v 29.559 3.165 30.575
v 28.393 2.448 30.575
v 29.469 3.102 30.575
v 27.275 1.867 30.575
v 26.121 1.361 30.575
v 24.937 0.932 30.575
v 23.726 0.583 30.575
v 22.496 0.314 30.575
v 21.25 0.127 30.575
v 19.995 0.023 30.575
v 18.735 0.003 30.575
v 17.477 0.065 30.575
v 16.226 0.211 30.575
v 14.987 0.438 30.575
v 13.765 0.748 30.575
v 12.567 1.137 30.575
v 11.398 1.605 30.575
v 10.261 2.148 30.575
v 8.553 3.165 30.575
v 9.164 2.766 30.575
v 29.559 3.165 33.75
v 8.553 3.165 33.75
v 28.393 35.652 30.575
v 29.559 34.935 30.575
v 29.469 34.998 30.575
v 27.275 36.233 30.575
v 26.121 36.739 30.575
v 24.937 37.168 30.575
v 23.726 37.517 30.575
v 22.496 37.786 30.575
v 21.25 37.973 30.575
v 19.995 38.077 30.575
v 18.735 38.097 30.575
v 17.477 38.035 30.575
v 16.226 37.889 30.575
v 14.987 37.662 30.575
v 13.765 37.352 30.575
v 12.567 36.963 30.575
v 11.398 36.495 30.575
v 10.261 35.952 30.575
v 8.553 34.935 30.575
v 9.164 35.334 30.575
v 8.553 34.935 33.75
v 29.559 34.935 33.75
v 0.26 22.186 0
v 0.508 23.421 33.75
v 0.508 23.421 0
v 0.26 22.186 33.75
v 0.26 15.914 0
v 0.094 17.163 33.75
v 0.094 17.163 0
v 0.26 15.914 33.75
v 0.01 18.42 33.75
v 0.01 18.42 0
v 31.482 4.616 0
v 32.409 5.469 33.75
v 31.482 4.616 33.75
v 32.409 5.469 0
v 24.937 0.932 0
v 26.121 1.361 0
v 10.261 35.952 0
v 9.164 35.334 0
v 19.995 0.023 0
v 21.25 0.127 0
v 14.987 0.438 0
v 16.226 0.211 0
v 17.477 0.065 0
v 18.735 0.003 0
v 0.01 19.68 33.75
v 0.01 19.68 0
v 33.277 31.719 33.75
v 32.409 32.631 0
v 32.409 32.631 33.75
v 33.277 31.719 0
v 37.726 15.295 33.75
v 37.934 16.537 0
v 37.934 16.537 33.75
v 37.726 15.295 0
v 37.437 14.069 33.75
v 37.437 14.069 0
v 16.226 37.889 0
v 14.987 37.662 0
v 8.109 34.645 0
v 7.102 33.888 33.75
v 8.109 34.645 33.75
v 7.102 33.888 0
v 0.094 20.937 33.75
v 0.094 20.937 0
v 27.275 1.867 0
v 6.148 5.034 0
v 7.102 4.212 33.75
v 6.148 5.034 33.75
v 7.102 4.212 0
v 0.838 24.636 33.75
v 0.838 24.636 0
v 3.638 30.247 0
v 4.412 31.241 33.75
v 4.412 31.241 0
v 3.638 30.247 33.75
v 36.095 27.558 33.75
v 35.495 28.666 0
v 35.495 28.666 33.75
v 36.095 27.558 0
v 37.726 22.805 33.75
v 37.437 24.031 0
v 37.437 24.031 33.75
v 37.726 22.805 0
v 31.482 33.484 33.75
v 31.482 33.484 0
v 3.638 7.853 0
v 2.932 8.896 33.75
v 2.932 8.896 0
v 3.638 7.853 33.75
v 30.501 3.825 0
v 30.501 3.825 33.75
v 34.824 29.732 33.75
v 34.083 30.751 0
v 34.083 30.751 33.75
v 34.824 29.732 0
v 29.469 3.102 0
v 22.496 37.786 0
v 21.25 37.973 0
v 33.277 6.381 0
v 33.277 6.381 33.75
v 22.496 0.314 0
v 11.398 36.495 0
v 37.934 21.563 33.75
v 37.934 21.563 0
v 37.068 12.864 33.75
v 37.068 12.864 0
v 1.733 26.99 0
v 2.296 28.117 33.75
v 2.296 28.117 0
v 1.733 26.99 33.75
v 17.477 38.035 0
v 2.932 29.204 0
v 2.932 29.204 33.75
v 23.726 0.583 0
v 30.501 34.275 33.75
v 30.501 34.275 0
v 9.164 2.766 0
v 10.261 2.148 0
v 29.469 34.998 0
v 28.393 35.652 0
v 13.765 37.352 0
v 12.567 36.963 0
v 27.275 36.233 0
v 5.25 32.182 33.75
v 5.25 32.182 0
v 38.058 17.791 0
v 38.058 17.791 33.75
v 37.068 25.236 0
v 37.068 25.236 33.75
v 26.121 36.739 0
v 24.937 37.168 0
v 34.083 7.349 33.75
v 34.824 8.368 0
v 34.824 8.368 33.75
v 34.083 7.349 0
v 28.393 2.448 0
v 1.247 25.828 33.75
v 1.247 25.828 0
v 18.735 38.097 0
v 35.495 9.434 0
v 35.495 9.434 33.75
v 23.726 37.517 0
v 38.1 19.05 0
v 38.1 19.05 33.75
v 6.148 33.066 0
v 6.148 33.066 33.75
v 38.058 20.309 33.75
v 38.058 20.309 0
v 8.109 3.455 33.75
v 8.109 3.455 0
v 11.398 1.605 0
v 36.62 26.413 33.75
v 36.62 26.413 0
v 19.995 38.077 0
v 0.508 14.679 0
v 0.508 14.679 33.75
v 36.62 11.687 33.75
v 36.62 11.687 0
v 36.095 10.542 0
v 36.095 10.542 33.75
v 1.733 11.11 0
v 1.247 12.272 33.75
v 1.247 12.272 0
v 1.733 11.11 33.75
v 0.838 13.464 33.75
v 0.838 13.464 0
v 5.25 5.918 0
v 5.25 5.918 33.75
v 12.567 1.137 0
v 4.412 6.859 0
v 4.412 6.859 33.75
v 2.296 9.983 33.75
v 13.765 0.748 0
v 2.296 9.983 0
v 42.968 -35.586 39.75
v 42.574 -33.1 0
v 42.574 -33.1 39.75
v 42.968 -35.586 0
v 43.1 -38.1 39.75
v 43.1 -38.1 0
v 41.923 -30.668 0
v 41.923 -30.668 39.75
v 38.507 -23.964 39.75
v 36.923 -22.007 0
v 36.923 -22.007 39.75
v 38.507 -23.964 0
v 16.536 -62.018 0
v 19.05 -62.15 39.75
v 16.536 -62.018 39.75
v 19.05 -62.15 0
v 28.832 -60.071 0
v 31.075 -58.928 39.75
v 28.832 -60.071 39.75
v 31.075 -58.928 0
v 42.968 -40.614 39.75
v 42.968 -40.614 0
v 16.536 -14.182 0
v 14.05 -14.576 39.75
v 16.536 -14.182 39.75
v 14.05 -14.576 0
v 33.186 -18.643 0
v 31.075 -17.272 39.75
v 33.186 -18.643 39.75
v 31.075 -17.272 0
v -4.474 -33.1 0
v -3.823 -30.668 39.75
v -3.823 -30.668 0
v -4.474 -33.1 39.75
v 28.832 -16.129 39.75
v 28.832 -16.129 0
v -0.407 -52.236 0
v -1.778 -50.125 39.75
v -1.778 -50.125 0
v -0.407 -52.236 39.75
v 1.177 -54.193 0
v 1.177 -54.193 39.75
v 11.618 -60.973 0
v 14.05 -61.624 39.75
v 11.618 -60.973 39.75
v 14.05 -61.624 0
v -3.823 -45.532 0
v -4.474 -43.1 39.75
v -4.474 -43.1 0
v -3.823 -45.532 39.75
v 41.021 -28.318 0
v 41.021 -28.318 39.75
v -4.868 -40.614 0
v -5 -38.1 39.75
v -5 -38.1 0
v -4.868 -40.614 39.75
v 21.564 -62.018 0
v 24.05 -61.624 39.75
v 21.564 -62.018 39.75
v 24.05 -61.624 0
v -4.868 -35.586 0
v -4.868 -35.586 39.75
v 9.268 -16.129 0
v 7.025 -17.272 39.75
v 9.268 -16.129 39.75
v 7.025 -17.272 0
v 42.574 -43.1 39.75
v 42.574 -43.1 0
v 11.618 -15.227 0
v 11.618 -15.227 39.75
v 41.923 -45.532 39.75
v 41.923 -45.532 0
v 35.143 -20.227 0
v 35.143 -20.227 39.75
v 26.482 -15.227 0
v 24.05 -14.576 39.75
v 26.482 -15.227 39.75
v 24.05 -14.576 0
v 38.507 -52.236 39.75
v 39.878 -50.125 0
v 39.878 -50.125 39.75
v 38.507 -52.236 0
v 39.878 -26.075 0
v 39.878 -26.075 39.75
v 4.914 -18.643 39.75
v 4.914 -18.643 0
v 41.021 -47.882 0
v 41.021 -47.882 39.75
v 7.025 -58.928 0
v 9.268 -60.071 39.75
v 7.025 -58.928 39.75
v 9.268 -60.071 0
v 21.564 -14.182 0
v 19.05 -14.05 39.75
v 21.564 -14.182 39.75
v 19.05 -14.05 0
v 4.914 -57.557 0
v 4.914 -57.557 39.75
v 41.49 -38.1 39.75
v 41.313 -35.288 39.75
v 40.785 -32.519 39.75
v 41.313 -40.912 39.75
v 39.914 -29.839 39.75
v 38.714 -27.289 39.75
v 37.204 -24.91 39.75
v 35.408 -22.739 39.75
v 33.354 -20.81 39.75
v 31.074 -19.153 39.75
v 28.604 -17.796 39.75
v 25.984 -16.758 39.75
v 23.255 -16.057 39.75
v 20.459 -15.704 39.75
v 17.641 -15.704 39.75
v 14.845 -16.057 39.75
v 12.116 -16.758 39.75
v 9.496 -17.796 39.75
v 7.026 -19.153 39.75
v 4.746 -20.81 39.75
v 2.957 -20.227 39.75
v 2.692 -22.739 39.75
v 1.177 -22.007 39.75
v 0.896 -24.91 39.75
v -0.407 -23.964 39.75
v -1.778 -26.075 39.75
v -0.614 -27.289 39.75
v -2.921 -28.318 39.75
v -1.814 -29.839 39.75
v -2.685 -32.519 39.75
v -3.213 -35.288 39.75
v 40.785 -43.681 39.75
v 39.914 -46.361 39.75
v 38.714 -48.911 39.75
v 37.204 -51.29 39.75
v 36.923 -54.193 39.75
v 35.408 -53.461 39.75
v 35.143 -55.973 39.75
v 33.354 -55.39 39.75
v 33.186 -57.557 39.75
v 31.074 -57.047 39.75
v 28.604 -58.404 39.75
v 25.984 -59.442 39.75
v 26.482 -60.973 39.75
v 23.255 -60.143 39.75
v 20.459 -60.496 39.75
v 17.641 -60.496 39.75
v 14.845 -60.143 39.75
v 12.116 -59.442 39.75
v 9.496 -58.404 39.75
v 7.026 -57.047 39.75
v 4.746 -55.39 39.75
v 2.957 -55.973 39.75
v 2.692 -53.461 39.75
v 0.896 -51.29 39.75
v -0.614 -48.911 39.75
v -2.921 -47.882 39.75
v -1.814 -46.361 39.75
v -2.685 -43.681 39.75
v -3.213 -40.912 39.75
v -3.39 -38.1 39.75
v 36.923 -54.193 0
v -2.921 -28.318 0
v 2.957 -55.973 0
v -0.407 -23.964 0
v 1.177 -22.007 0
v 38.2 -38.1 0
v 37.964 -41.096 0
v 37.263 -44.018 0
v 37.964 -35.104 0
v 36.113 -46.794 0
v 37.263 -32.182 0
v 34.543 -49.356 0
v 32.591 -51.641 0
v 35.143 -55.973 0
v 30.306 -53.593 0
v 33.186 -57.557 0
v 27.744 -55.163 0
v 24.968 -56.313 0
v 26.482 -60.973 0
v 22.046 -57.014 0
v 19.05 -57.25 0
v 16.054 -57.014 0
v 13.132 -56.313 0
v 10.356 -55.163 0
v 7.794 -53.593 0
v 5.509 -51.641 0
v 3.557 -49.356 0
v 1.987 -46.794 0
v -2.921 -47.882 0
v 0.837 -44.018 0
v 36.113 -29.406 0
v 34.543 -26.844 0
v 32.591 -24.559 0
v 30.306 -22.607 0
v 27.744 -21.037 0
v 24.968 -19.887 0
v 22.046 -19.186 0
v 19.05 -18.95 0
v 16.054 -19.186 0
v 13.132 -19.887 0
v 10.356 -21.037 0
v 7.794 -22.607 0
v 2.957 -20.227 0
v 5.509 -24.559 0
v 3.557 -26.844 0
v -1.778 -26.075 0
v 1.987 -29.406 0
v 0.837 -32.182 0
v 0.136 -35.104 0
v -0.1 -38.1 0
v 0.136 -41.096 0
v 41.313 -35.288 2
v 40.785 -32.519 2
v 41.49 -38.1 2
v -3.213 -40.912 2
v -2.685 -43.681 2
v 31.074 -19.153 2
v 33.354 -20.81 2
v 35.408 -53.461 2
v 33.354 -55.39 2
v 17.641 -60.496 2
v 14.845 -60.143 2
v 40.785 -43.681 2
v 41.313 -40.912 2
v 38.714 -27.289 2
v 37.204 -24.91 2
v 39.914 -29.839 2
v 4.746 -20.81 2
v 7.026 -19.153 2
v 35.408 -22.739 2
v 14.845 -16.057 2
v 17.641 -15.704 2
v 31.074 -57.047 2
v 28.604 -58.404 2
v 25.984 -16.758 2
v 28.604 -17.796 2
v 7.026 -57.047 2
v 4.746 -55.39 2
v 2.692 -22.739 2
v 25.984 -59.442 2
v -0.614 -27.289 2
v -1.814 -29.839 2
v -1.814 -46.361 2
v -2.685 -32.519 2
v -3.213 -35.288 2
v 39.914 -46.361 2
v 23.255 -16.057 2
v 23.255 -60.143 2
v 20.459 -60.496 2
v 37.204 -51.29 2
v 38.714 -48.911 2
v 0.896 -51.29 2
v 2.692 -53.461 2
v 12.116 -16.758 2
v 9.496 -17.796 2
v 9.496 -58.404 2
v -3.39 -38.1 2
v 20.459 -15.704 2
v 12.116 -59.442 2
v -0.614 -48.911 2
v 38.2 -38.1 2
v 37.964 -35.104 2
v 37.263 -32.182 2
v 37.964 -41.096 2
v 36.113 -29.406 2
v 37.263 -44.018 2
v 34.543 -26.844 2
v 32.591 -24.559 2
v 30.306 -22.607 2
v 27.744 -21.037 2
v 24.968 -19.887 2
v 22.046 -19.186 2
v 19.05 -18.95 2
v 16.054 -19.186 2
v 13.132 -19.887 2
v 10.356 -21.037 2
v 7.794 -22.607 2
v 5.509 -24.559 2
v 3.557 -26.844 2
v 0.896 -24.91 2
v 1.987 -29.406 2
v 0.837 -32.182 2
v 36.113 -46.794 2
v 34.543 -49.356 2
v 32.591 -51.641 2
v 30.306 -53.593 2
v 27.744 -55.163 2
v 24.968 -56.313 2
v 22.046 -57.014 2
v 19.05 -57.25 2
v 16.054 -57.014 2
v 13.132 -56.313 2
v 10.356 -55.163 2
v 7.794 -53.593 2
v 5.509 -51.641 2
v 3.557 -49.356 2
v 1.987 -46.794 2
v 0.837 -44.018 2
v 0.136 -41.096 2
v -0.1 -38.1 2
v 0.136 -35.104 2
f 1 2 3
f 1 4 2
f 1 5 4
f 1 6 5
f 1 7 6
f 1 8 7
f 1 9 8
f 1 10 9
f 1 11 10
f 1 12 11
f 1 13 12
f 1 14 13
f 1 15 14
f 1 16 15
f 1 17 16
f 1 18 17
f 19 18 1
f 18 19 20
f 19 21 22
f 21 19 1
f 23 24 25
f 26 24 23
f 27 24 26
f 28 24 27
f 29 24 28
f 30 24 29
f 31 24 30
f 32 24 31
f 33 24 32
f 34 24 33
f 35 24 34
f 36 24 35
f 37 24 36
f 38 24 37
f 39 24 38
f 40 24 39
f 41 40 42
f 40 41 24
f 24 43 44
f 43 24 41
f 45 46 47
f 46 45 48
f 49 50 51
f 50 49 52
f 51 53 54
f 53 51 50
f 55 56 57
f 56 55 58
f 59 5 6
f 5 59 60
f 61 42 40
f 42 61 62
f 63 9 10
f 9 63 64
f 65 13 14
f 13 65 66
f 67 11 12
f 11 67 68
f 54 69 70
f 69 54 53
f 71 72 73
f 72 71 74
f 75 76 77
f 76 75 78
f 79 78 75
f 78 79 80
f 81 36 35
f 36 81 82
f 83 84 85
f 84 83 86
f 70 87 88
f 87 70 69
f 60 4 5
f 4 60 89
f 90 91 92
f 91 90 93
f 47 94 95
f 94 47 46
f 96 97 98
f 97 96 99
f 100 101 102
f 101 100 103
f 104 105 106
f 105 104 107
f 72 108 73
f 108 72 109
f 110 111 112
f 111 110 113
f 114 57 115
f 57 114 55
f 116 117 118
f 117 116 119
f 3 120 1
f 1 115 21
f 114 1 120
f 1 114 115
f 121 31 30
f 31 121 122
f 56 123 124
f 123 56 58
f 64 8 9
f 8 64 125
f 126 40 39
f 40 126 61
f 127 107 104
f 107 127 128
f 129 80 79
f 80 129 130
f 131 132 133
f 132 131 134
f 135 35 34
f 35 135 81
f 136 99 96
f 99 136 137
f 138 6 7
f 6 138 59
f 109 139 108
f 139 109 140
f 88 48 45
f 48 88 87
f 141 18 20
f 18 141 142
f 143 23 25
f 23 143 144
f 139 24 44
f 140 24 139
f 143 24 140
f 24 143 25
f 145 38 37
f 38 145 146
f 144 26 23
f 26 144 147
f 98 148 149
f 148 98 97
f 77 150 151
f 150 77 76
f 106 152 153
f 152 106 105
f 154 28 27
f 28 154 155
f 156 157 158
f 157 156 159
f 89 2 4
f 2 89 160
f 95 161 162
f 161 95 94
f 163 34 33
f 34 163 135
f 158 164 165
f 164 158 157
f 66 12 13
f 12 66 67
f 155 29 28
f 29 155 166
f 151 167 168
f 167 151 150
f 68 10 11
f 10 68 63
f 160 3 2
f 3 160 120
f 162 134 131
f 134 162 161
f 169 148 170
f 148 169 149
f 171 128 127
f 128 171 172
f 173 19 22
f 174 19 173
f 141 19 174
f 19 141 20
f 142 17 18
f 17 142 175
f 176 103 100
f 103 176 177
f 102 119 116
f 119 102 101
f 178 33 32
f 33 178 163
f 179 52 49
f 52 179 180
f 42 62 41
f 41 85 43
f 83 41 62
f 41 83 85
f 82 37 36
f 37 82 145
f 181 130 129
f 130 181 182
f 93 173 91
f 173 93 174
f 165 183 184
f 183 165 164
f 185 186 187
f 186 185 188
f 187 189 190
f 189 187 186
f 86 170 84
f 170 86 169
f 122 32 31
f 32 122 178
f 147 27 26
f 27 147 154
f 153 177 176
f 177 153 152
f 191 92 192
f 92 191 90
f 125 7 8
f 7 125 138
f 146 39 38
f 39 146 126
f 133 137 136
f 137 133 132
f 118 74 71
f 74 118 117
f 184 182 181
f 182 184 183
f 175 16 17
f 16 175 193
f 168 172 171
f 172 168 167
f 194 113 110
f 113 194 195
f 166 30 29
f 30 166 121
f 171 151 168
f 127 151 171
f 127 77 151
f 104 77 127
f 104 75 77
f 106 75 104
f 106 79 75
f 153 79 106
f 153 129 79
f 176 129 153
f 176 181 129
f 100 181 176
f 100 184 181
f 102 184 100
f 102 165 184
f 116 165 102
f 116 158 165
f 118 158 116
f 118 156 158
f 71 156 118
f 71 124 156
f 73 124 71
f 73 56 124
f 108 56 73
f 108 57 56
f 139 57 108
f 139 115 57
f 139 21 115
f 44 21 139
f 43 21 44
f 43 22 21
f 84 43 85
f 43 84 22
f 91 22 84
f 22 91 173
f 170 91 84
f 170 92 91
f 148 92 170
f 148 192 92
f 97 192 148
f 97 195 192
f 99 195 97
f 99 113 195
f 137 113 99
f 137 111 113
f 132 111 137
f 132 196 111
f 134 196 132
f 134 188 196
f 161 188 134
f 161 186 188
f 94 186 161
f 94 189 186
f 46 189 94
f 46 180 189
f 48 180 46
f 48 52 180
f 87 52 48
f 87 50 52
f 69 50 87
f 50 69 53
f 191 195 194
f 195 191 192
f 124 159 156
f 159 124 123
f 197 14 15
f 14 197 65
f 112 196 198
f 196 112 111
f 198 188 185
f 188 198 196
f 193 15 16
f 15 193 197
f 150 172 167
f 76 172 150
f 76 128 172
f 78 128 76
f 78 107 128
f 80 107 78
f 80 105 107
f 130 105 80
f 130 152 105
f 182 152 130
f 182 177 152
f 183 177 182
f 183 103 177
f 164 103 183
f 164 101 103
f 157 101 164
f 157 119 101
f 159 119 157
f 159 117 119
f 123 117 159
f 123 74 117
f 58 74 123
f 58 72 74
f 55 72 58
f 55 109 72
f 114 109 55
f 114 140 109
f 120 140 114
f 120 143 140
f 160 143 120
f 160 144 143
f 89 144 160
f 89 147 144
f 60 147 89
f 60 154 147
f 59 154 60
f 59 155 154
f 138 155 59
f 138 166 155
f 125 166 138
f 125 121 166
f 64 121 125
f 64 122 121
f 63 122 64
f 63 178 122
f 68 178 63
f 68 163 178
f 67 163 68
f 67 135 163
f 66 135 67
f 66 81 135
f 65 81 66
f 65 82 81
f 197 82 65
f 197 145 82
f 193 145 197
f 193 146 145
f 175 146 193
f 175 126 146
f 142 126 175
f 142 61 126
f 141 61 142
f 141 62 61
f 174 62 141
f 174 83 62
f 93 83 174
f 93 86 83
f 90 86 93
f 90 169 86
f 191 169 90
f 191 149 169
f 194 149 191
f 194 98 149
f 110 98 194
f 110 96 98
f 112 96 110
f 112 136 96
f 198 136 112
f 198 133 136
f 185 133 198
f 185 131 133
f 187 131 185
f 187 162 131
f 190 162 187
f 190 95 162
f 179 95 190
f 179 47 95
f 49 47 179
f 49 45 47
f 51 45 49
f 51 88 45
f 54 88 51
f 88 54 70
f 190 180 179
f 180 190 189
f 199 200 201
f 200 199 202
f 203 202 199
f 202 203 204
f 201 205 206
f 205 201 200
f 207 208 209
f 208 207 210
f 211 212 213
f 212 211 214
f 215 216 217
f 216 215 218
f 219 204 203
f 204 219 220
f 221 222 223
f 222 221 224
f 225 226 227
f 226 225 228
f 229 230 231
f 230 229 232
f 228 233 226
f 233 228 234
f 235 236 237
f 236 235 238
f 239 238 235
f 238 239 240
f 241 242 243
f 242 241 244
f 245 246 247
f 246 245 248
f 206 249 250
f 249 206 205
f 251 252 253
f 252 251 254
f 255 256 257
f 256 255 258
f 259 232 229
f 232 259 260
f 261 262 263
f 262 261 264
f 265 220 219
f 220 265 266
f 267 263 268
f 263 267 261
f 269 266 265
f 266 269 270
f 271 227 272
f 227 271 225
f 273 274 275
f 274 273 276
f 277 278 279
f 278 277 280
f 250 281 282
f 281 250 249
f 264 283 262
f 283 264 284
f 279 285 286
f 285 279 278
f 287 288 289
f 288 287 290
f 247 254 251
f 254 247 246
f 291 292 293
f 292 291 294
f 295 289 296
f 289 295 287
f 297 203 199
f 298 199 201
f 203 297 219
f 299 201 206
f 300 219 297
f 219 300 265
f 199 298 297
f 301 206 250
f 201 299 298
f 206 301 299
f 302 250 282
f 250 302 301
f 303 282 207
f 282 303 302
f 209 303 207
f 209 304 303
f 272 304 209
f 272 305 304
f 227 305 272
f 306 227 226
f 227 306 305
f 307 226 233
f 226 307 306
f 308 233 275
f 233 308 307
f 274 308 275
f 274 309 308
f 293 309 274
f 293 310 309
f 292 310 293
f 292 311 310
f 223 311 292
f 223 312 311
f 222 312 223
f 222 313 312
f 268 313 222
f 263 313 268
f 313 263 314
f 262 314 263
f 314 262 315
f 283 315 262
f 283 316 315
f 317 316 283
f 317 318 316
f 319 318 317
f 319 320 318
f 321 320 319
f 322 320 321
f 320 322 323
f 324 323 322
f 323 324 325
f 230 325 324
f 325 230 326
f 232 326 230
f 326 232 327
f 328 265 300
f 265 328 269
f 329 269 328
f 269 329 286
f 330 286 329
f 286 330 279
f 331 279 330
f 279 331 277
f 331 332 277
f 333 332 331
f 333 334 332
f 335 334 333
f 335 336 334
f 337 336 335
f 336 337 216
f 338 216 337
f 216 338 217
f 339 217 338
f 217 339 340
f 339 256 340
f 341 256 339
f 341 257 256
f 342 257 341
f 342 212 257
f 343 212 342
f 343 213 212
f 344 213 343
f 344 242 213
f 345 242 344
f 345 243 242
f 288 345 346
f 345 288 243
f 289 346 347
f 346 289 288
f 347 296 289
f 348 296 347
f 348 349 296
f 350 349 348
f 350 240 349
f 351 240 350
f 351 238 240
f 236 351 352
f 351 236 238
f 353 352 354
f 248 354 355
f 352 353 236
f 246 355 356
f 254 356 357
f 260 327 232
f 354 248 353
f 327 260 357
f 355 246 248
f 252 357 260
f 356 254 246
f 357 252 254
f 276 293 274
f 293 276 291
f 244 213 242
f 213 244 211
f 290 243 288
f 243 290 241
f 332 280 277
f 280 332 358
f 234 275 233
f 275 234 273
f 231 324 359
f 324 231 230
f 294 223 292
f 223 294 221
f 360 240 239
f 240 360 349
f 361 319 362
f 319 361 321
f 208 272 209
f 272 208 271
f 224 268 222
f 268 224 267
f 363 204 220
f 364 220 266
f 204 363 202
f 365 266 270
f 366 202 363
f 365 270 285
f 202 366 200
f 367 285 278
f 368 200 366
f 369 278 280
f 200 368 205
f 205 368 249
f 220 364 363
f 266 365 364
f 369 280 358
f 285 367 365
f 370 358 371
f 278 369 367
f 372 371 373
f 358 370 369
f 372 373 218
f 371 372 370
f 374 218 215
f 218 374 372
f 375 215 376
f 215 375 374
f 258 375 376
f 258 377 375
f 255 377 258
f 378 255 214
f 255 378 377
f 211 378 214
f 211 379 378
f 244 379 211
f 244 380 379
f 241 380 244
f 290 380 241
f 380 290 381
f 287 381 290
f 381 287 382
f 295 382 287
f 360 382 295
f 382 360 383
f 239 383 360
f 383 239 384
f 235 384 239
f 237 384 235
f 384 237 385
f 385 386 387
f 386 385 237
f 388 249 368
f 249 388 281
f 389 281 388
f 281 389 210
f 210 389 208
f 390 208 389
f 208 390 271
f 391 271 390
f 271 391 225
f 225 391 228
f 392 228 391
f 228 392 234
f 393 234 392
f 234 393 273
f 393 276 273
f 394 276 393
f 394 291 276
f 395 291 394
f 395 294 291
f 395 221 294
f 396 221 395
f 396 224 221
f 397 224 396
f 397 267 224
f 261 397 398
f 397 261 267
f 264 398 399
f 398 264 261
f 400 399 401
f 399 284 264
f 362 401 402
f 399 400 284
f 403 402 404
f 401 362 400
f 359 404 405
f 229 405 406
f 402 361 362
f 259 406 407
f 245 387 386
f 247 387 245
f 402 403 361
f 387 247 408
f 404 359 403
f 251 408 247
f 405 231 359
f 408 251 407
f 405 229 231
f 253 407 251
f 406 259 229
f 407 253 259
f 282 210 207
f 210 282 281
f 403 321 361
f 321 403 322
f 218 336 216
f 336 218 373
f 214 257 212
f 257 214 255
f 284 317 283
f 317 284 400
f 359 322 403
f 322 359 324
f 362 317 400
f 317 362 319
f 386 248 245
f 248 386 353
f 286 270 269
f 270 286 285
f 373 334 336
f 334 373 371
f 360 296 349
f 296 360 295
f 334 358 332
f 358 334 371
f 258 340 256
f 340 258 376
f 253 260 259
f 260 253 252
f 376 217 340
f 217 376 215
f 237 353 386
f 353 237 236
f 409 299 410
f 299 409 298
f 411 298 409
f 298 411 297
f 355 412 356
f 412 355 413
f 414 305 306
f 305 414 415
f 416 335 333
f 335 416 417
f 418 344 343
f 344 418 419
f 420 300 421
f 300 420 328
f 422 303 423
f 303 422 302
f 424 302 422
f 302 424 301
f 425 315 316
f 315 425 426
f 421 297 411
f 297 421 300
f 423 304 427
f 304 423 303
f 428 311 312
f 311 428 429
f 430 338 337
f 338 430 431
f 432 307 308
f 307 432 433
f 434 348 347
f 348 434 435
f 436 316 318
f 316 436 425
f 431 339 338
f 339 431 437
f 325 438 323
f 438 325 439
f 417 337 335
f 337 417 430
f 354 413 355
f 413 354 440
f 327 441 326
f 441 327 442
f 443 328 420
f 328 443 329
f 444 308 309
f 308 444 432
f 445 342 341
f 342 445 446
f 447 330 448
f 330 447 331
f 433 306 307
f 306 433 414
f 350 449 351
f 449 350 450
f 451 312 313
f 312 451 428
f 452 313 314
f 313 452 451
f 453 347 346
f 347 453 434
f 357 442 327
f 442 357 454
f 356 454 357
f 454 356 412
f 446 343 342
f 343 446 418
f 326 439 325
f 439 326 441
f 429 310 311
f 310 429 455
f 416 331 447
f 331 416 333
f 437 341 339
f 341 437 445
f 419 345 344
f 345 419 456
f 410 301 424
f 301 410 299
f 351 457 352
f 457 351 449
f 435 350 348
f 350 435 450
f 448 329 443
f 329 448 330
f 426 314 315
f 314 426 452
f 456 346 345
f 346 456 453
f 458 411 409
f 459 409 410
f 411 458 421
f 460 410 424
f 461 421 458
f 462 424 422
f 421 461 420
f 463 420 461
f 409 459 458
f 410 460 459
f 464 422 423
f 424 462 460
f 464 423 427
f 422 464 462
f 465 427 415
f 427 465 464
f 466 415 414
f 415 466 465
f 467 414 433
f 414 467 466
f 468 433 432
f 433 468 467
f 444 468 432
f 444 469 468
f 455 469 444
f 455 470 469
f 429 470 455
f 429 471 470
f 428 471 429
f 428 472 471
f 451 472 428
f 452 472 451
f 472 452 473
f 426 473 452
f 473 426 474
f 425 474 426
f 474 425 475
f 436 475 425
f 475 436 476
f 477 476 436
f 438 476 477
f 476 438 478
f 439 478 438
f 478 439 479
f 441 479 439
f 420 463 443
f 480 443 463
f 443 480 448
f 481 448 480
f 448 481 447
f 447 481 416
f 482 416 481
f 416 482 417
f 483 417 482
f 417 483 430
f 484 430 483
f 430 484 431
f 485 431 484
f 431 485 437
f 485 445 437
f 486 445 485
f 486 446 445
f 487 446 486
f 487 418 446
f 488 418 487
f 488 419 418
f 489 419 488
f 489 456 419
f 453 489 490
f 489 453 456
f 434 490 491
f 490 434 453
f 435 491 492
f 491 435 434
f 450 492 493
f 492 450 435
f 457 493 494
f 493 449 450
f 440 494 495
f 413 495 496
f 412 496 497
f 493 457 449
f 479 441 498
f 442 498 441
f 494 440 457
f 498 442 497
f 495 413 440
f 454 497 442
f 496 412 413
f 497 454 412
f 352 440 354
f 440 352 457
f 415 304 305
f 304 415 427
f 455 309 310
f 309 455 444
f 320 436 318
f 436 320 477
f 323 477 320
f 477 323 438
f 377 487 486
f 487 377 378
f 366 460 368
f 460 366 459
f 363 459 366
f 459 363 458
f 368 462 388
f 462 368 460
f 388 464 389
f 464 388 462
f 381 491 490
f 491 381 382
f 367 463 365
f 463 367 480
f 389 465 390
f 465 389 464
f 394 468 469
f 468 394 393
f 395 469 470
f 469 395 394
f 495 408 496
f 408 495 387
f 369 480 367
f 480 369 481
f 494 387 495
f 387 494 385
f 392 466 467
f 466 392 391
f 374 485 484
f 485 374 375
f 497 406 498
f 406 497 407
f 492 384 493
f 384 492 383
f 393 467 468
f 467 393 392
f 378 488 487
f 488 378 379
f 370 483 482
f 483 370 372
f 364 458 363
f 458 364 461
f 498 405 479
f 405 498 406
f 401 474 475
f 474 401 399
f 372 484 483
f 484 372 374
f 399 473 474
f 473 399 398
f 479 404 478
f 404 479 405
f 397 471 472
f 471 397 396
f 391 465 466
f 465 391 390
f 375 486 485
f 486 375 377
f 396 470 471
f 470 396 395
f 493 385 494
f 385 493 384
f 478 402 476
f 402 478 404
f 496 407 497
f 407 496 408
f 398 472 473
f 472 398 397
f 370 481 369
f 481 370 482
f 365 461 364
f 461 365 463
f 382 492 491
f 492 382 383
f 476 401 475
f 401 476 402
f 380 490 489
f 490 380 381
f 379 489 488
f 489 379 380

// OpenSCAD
sides=inches(1.5);
h=inches(1.25)+2;
lip=inches(.125);
r=sides/2;
shell=1;
difference() {
  linear_extrude(h,convexity=3)
    hull()
      for(x=[r,sides-r],y=[r,sides-r])
        translate([x,y]) circle(r=r,$fn=max(12,r*5));
  for(y=[-.01,sides-lip+.01]) translate([-.01,y,h-lip]) cube([sides+.02,lip,lip+.01]);
}
if(shell) {
  translate([sides/2,-sides]) difference() {
    cylinder(d=sides+10,h=h+6,$fn=60);
    translate([0,0,2]) cylinder(d=sides+10-1.61*2,h=h+10,$fn=50);
    translate([0,0,-.01]) cylinder(d=sides+.2,h=2.02,$fn=40);
  }
}
function inches(in) = 25.4 * in;
